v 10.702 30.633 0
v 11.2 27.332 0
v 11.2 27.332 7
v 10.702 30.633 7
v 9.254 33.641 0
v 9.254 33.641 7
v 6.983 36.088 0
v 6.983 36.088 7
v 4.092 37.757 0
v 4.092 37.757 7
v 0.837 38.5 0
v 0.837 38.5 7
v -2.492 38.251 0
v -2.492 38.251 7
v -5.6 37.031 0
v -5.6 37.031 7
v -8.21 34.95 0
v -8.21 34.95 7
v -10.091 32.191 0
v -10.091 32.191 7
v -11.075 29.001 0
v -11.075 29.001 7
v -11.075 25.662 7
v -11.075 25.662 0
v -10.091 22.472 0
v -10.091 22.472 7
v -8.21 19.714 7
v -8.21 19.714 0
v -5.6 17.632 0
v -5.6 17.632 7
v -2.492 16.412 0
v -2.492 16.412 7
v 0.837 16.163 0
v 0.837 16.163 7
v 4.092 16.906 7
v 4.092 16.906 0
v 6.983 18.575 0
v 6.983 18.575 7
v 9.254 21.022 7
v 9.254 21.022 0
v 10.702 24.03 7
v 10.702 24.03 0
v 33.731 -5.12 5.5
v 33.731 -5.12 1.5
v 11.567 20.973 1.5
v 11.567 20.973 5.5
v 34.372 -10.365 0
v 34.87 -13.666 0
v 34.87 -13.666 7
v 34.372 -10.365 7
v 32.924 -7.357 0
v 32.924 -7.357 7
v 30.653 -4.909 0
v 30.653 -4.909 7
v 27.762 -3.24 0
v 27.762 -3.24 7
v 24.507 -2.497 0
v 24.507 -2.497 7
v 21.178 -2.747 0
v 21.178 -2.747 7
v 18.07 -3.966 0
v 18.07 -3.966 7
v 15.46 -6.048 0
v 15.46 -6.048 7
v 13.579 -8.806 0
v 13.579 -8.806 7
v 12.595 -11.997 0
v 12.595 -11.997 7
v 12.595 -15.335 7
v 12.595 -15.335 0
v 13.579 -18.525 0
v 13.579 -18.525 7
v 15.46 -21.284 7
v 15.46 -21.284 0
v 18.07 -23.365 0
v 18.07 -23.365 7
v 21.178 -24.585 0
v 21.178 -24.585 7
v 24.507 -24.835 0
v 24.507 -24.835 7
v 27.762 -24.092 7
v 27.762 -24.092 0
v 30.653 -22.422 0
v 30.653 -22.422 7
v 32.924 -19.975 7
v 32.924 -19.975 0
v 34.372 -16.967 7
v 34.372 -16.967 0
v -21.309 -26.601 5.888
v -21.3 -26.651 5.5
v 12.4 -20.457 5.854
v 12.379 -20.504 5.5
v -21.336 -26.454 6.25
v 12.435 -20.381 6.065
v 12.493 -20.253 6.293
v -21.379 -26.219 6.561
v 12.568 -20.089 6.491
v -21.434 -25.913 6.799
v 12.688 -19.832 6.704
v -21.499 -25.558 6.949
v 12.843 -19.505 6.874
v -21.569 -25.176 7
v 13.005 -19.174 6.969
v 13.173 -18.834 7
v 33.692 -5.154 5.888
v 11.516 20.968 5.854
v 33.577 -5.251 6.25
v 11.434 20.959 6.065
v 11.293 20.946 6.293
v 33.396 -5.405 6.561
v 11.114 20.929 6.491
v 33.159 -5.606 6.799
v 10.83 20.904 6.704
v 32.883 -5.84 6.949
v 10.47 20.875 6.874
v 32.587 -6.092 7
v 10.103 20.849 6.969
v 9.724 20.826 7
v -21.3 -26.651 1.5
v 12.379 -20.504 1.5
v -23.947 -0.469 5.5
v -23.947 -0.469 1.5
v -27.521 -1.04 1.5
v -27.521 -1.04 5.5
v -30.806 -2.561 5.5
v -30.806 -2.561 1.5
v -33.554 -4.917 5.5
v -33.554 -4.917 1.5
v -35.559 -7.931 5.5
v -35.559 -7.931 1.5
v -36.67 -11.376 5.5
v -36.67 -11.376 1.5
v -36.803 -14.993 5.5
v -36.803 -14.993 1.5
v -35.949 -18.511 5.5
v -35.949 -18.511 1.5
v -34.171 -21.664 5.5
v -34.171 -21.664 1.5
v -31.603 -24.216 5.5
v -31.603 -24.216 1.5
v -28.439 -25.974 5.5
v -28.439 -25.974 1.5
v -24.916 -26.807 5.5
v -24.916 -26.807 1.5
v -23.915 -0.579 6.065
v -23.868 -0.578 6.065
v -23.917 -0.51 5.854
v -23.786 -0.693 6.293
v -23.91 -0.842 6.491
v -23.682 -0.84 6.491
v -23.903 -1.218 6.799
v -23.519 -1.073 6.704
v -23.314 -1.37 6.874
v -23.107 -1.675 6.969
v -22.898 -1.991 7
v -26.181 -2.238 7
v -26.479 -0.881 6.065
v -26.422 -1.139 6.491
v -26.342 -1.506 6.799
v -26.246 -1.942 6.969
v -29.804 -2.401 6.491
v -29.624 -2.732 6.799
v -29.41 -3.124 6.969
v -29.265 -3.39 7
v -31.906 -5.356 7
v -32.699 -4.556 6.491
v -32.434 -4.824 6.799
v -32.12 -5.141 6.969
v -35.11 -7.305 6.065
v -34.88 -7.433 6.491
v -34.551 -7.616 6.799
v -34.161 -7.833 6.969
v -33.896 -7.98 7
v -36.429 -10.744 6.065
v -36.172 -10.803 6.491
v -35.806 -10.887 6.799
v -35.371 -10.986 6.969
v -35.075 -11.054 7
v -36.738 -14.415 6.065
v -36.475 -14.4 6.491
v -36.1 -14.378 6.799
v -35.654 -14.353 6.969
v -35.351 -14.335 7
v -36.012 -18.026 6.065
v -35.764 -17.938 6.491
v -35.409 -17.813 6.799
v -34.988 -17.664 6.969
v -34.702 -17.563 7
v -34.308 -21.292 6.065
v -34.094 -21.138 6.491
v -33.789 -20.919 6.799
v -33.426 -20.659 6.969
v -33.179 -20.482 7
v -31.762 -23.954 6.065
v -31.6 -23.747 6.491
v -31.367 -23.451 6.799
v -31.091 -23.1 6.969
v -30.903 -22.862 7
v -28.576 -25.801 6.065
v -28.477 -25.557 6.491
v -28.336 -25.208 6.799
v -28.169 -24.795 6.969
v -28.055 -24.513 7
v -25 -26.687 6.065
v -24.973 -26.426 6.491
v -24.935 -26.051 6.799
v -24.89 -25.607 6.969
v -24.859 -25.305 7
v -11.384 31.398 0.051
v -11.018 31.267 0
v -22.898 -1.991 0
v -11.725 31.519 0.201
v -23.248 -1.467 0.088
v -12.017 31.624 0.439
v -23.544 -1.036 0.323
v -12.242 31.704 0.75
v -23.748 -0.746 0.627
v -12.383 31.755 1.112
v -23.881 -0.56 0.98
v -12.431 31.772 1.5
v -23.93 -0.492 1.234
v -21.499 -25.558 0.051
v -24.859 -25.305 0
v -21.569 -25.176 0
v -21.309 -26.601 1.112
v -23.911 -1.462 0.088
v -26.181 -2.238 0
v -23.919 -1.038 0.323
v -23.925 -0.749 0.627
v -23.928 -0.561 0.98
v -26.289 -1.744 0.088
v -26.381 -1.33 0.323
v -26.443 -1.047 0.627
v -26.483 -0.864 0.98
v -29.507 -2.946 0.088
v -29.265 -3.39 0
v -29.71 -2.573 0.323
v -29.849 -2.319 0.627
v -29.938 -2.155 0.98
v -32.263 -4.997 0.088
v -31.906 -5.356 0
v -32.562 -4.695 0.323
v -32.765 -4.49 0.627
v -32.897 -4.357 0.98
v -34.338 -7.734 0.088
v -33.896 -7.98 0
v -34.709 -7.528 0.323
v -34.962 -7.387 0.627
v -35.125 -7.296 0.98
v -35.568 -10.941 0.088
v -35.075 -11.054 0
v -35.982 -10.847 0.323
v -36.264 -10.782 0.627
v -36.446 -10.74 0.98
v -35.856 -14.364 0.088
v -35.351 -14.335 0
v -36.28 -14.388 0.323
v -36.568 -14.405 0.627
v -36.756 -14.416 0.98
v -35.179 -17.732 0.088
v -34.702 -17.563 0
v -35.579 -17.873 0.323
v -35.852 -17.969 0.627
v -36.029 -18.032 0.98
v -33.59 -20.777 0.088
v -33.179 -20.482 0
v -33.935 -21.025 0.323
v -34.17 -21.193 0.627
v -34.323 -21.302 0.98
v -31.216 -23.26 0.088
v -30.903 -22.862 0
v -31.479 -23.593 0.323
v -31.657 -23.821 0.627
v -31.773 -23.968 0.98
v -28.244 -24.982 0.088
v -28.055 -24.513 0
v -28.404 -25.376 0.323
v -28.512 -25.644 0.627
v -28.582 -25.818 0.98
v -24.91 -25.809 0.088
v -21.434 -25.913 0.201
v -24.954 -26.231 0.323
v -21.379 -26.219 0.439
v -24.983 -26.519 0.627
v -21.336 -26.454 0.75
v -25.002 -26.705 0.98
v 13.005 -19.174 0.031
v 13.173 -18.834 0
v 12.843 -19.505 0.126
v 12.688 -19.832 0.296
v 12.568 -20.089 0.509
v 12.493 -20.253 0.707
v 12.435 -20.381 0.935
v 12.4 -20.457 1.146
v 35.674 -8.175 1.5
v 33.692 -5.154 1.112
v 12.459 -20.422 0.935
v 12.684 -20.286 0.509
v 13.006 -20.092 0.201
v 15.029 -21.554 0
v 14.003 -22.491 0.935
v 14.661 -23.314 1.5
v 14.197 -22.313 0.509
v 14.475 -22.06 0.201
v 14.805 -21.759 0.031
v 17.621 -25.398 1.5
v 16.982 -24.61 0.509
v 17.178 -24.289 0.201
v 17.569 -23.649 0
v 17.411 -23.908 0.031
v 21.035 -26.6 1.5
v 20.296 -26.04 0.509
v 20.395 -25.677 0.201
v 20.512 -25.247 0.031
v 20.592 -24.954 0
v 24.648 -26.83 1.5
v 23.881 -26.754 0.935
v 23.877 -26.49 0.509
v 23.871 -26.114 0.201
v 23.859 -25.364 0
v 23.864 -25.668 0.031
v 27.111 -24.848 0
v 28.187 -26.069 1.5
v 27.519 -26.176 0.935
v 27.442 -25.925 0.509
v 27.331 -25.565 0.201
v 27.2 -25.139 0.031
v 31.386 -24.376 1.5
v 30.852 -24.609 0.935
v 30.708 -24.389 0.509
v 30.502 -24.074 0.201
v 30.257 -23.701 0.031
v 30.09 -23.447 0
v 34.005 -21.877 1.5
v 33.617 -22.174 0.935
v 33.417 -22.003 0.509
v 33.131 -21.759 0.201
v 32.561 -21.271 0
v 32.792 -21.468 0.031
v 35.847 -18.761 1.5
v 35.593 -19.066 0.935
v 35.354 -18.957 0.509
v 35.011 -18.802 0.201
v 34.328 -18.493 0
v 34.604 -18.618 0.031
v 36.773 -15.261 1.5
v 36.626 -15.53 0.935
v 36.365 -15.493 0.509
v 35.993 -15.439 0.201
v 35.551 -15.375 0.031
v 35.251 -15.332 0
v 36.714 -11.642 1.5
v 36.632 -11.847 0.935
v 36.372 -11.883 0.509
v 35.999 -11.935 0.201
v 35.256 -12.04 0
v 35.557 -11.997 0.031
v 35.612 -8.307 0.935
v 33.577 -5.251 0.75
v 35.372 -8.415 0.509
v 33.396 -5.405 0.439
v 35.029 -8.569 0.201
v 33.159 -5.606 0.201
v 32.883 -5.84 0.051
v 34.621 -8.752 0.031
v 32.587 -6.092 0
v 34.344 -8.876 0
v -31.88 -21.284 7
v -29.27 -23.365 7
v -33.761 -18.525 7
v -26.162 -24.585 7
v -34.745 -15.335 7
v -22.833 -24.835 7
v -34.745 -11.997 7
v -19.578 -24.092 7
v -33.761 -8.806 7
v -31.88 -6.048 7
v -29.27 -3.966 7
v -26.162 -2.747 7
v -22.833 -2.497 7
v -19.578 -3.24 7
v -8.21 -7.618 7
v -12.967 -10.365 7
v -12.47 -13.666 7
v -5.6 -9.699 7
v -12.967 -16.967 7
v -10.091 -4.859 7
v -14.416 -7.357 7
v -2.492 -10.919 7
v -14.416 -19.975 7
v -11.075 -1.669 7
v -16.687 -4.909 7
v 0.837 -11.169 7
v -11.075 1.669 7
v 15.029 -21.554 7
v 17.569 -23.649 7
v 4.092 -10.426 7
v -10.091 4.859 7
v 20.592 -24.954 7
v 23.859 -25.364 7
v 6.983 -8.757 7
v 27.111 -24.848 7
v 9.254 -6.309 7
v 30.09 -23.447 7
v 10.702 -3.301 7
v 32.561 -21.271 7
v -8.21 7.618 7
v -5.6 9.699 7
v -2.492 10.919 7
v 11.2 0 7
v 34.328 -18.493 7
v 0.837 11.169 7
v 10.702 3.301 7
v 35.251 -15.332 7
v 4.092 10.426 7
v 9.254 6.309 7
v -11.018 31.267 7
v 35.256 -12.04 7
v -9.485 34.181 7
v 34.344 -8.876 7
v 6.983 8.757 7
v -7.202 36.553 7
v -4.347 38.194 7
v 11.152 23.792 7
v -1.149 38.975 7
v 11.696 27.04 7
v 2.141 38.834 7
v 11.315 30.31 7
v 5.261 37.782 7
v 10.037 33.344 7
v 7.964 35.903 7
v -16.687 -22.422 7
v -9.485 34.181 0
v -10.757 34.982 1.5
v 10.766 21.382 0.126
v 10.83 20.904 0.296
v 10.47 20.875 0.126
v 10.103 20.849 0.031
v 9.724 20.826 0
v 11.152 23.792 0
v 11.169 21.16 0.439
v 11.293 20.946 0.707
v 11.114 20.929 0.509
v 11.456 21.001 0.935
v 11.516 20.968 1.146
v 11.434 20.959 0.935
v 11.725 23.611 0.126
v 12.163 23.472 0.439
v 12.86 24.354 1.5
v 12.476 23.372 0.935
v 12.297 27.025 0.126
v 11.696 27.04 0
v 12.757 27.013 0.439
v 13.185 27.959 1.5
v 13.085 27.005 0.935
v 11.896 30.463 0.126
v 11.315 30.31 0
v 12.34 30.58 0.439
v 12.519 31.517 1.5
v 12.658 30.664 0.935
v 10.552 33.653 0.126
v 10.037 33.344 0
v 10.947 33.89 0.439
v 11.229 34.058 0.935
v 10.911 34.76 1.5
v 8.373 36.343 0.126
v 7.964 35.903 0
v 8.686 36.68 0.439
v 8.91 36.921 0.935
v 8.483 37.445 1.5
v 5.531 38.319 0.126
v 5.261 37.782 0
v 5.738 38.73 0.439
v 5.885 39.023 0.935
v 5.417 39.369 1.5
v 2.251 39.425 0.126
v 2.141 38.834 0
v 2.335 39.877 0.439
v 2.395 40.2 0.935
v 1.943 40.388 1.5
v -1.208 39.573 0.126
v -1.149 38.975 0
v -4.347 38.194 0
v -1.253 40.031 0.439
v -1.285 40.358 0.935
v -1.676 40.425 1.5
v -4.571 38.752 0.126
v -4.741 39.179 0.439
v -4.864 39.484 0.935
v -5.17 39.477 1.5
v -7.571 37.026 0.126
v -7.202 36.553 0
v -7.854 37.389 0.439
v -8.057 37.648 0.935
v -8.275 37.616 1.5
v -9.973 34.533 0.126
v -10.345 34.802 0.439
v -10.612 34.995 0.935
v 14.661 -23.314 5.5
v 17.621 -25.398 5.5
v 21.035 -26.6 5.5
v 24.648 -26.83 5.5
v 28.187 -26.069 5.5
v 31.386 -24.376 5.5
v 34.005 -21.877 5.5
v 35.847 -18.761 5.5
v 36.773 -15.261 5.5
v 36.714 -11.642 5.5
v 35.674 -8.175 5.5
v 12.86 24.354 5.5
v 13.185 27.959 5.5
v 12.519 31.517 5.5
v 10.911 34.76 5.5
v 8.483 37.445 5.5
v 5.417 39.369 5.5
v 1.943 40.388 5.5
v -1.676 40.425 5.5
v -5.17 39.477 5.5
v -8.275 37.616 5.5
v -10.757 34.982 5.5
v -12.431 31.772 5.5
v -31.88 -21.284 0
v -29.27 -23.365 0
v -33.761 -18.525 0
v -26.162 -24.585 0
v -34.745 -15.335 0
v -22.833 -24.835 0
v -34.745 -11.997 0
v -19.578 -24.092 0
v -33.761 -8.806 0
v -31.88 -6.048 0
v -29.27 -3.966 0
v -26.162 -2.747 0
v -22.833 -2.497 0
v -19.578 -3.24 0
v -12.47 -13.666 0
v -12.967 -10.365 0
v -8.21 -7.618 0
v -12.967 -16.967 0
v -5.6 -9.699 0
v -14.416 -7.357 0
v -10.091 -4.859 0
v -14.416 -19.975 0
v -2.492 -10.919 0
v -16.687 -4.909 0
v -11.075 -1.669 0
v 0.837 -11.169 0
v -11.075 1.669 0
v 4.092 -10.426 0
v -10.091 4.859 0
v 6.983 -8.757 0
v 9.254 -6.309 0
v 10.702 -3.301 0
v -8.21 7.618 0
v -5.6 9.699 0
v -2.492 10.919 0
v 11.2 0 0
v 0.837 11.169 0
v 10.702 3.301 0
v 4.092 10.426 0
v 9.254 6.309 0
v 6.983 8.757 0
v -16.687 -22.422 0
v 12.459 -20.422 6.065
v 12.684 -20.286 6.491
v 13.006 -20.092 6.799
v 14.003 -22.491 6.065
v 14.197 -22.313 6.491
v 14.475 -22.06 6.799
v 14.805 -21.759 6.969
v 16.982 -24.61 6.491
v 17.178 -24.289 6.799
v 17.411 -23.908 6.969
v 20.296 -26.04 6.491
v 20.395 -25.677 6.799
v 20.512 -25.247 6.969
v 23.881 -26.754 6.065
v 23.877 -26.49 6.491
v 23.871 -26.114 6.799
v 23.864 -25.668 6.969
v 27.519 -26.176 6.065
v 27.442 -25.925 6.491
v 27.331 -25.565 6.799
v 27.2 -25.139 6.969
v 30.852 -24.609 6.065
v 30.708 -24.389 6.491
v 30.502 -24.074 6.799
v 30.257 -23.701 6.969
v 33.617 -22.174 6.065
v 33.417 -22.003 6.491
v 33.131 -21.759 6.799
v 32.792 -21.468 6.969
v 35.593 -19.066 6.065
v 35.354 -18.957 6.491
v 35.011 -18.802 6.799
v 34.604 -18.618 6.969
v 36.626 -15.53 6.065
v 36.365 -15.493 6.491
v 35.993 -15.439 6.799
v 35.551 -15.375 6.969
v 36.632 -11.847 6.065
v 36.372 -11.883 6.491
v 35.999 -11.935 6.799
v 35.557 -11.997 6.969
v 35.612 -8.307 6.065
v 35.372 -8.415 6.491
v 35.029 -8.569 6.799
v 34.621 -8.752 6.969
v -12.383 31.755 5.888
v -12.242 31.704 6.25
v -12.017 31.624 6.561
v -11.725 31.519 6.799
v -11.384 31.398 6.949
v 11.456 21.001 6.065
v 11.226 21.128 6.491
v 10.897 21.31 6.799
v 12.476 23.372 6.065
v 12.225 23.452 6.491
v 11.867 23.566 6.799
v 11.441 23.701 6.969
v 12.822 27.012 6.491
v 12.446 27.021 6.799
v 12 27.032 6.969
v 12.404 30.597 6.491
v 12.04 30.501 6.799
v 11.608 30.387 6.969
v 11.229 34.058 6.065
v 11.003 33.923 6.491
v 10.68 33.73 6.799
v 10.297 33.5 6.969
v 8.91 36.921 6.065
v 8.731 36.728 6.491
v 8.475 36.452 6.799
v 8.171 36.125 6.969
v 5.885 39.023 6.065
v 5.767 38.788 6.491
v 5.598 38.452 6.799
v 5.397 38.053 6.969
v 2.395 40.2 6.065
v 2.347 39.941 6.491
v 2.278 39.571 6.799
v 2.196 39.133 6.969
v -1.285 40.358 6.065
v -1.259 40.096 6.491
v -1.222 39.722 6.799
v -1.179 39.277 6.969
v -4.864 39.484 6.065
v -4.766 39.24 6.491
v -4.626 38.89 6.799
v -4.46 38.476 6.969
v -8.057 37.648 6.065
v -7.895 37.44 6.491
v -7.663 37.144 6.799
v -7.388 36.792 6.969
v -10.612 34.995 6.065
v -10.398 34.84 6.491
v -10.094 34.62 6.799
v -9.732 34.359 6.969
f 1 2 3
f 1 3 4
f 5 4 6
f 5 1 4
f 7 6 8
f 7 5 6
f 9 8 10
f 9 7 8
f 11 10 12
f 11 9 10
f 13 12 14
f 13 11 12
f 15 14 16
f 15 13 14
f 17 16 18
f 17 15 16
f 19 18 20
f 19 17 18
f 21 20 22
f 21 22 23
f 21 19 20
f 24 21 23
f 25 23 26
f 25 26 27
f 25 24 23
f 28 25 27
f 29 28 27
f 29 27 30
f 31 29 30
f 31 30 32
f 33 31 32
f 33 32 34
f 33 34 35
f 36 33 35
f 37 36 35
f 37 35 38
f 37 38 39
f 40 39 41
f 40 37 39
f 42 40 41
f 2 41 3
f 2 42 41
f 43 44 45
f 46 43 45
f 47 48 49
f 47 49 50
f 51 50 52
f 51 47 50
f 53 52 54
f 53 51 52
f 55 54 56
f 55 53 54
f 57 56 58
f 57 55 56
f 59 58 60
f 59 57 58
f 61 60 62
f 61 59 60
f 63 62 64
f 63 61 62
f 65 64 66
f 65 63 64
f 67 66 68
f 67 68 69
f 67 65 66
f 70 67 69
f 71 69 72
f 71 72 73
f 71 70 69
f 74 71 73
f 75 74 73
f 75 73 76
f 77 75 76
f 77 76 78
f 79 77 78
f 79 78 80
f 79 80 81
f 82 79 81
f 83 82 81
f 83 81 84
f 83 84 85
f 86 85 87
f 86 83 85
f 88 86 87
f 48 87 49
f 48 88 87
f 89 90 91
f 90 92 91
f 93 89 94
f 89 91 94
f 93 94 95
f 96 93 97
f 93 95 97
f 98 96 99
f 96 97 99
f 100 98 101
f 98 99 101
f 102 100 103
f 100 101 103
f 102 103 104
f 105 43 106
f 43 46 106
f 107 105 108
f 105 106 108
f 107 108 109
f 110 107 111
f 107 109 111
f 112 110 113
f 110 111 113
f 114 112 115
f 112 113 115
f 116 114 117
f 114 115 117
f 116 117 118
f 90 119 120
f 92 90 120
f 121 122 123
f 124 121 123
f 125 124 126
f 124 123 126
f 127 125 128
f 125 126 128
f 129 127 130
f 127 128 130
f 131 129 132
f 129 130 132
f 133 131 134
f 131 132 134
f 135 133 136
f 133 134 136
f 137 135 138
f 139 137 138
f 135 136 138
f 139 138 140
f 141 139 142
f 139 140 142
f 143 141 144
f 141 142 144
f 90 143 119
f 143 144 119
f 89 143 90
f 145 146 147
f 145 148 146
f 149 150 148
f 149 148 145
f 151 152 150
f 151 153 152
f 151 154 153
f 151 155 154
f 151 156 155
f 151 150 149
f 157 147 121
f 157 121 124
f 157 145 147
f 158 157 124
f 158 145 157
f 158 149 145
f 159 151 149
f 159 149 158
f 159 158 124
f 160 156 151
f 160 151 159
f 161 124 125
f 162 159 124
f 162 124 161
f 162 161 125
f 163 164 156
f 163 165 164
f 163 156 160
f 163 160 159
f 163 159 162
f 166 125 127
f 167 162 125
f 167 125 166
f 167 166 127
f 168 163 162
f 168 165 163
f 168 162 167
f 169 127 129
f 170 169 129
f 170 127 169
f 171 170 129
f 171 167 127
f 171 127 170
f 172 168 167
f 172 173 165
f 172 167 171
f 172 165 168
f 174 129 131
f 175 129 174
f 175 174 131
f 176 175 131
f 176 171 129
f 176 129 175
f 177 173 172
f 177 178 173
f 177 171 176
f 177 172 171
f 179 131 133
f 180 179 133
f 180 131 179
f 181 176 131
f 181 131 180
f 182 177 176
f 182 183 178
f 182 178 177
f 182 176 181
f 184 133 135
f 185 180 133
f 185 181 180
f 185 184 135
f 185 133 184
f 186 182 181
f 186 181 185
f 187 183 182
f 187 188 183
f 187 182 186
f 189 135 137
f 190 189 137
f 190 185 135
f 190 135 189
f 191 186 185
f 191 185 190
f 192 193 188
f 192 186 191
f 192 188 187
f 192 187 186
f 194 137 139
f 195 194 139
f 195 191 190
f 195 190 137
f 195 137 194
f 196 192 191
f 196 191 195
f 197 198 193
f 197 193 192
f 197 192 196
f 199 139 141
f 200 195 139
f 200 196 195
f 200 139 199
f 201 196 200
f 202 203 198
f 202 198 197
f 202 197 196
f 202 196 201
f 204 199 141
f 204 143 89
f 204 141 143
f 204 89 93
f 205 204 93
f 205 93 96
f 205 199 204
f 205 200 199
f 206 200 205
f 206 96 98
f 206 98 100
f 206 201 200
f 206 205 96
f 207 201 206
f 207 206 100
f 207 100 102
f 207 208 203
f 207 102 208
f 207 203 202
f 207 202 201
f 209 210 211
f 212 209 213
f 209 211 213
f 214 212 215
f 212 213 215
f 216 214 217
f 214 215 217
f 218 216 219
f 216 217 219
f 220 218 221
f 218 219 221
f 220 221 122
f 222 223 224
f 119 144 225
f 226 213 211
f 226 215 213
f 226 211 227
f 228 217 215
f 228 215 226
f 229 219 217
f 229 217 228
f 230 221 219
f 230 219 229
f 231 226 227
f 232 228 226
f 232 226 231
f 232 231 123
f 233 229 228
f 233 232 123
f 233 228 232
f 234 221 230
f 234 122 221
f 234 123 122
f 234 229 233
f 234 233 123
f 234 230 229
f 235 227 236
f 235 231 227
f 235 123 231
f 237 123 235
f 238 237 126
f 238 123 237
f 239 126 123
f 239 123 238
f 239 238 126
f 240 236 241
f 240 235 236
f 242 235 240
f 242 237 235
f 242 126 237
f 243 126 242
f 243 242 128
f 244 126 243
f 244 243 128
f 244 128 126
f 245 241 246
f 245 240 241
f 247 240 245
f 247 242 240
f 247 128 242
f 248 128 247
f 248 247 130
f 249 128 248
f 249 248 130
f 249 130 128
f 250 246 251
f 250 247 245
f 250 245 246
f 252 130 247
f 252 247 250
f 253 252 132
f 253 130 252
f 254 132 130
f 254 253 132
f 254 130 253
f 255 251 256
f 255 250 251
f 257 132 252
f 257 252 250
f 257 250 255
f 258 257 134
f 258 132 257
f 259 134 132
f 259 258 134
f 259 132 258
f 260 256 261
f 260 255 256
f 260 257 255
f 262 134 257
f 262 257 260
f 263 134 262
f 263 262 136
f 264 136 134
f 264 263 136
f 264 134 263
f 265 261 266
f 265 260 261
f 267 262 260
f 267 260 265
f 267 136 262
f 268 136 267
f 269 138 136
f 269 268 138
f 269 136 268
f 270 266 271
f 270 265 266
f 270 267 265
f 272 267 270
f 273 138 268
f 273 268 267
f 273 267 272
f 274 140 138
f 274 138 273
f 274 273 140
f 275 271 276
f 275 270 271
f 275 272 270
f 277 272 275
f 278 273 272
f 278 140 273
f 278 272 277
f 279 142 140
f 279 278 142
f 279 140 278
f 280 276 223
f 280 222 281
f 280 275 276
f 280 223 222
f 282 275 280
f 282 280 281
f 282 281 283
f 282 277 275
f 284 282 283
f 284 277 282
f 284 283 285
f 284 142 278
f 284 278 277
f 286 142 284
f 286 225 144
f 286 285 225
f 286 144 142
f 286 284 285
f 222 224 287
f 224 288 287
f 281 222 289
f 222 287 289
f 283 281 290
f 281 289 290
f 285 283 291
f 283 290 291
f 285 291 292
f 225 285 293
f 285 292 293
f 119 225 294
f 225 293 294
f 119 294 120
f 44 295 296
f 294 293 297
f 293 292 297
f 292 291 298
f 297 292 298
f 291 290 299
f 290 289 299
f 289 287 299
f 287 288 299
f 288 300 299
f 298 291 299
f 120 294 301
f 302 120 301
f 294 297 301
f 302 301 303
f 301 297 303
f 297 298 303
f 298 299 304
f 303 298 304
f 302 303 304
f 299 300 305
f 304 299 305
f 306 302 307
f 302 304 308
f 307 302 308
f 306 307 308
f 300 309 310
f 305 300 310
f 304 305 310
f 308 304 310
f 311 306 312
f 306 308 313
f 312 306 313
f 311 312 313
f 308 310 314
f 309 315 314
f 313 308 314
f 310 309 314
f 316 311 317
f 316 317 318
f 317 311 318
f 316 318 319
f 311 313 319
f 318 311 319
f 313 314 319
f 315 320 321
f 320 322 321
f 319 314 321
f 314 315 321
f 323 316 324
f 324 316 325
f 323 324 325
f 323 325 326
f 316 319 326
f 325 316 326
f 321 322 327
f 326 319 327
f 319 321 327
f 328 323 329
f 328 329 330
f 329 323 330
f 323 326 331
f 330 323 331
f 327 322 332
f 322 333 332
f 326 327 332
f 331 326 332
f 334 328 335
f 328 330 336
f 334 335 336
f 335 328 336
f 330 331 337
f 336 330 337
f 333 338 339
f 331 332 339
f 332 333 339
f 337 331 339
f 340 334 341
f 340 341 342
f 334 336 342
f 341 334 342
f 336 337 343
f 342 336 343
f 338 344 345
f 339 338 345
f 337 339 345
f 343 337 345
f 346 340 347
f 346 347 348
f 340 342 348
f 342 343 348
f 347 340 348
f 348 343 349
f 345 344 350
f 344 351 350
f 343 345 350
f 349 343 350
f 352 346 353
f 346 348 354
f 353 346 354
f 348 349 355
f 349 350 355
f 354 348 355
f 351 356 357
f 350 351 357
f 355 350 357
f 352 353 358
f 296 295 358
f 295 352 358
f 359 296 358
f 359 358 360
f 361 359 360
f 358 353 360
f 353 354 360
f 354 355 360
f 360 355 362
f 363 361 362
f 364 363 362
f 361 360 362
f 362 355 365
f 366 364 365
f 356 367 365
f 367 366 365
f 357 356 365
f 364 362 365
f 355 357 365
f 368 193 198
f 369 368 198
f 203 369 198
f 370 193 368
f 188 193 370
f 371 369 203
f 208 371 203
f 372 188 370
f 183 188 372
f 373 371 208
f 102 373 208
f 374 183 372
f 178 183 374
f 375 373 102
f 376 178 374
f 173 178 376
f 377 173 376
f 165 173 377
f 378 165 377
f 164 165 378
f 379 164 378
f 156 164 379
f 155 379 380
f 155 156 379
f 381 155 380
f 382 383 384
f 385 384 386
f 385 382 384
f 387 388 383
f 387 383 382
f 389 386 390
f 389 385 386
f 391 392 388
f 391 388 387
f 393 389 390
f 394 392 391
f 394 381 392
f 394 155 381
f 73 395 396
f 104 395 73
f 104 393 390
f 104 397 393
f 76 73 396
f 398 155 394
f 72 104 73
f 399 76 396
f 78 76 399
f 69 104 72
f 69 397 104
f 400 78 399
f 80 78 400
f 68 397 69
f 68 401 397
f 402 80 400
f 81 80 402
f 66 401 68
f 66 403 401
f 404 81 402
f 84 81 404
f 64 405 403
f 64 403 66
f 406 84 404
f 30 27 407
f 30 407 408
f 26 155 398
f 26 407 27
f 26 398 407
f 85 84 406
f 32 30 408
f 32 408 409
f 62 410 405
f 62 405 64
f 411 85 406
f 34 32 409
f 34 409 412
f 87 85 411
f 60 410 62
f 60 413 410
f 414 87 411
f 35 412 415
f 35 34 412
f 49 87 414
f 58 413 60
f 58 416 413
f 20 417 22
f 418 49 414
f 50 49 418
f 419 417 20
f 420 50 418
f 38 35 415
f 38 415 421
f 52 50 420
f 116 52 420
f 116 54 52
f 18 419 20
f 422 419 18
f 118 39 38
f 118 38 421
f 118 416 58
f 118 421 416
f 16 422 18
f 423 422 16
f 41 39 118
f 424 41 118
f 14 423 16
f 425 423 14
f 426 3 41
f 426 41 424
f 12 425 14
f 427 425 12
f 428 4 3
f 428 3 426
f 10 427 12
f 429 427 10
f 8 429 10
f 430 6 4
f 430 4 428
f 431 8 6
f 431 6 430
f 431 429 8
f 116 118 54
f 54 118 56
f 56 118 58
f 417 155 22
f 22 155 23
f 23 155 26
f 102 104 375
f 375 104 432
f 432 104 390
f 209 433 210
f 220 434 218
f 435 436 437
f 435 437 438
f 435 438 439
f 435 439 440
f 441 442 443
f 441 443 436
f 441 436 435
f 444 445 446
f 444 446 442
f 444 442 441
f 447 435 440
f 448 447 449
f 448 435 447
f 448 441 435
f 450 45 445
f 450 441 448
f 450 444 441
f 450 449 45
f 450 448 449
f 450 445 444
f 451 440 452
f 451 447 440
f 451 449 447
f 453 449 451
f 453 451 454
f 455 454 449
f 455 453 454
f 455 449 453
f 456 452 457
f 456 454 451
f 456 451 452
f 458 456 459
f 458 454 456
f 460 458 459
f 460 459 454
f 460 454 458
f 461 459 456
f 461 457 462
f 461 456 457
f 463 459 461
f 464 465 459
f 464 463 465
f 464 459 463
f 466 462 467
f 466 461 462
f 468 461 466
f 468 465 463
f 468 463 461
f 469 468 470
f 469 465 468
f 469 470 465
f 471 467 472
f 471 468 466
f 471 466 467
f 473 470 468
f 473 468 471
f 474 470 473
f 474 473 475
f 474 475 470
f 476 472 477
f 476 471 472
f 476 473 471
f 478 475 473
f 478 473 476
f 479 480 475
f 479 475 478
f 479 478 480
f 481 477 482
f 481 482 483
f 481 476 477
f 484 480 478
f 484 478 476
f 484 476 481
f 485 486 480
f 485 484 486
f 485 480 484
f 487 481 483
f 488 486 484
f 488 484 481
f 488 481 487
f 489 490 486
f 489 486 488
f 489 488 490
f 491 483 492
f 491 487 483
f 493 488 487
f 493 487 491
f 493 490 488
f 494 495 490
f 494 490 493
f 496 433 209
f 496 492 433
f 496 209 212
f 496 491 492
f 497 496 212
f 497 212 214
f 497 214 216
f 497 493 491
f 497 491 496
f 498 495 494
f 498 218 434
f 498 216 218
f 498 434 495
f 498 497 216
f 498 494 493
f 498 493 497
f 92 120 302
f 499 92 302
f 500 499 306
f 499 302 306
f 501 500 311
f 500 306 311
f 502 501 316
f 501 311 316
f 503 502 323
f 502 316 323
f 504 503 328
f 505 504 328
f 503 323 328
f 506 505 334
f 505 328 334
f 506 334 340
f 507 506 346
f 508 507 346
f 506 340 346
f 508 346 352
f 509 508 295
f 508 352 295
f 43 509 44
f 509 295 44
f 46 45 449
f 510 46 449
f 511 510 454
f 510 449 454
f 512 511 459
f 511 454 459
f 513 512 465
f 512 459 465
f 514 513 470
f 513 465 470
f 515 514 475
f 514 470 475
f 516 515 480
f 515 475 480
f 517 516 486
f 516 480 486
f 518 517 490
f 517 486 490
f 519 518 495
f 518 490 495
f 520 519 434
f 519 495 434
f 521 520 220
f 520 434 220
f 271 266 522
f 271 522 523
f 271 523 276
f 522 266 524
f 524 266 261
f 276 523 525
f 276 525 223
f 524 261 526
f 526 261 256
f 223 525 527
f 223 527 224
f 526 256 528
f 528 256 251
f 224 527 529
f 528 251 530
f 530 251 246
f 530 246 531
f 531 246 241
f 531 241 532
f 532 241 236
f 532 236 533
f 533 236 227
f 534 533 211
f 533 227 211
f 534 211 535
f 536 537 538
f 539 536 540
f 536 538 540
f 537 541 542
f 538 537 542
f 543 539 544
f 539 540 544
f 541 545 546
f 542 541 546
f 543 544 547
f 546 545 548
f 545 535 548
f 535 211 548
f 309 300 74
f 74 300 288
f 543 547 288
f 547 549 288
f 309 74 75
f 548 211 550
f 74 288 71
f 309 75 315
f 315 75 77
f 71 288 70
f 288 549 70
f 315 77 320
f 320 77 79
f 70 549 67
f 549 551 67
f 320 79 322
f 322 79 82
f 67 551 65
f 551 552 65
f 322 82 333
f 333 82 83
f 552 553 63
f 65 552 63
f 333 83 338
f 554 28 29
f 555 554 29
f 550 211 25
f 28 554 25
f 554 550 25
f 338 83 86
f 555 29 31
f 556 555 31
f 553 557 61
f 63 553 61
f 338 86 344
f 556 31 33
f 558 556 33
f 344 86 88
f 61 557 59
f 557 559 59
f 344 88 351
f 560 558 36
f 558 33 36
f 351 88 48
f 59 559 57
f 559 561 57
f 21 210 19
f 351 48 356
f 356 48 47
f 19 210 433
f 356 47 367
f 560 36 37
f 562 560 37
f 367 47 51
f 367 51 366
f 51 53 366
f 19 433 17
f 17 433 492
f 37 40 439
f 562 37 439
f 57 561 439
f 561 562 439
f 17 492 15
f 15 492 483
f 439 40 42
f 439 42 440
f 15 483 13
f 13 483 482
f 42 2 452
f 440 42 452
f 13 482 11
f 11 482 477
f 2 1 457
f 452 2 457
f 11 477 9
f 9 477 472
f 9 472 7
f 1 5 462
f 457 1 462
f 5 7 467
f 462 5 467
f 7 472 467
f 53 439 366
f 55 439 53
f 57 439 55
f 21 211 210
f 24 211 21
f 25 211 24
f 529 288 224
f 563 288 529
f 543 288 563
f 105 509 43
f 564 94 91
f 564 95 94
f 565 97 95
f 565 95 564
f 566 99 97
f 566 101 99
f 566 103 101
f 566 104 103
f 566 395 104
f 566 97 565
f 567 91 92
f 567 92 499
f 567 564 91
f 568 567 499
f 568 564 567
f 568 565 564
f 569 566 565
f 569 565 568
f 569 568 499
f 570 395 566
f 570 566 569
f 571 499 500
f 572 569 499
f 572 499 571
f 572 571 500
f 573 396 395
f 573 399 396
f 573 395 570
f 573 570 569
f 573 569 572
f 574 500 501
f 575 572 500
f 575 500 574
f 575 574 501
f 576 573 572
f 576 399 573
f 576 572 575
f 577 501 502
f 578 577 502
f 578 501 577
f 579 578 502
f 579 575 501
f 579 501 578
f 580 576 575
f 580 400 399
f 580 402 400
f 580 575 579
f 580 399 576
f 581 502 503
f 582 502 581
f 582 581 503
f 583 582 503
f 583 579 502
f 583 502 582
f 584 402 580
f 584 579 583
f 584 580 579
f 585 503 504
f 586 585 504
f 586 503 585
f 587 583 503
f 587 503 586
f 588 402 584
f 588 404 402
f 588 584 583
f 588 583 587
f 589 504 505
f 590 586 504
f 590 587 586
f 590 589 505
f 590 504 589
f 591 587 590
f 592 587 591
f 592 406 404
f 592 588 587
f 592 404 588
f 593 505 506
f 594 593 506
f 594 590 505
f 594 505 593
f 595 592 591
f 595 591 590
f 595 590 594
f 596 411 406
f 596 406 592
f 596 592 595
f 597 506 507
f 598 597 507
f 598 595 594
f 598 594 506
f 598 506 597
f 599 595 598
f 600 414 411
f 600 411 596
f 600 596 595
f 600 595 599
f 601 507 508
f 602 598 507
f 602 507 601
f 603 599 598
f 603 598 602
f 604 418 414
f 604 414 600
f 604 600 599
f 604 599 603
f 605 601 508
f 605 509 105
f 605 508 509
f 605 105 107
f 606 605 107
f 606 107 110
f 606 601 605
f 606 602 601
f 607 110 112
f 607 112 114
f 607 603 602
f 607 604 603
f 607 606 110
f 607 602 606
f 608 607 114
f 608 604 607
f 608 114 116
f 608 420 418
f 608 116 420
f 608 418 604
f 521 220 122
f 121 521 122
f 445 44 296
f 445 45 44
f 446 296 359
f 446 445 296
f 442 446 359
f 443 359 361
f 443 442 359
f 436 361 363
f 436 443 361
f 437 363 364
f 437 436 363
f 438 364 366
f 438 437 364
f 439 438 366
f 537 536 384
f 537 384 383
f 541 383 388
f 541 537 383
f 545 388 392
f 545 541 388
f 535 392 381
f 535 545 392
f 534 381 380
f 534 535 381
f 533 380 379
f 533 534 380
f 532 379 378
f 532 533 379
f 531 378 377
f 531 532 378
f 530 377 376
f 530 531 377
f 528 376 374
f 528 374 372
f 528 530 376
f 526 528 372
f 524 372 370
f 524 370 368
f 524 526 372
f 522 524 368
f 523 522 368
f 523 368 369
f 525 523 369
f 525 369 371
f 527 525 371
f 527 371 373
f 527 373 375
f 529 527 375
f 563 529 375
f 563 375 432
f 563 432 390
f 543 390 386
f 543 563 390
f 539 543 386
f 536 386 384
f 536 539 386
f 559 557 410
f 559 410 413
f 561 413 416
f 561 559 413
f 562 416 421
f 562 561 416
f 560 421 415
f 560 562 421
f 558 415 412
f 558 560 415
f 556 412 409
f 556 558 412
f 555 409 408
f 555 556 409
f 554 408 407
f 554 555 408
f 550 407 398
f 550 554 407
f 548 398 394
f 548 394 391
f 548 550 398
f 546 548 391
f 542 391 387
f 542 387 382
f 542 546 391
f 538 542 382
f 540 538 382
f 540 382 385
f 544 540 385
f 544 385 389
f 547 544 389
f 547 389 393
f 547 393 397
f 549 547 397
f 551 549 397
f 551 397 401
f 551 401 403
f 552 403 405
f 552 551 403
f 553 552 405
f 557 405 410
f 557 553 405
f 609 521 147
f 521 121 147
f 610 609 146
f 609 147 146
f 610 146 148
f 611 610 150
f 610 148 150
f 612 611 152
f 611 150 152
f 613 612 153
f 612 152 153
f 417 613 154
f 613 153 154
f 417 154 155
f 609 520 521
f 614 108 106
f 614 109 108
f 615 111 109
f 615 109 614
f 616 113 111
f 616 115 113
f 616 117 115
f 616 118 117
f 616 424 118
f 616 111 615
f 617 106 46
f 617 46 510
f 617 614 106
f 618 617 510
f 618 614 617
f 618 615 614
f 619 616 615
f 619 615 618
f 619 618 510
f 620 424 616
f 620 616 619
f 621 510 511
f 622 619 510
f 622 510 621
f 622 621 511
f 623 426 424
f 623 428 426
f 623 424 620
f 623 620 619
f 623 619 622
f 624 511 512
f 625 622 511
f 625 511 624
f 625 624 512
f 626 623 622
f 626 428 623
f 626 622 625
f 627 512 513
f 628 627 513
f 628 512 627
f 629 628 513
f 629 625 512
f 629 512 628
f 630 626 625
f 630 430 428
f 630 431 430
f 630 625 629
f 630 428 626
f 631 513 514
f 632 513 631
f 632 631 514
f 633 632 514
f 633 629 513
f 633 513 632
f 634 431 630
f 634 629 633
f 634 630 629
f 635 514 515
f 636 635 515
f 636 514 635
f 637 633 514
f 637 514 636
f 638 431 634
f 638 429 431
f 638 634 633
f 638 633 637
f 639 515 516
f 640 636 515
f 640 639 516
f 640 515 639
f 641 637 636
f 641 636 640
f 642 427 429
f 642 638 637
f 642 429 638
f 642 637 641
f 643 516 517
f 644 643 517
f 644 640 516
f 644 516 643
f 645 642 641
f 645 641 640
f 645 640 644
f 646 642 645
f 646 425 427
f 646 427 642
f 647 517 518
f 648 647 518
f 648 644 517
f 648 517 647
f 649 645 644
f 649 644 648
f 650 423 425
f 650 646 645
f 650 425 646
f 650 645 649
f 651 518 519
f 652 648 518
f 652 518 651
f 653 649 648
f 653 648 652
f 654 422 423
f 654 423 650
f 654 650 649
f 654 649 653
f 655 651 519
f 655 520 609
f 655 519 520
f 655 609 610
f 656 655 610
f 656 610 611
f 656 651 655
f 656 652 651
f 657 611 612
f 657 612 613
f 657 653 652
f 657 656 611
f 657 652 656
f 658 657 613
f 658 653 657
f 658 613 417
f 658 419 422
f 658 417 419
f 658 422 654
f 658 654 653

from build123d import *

# Parameters (mm, degrees)
F0_R     = 11.2
F1_DEPTH = 7
F2_R     = 1.5
F3_R     = 1.5


with BuildPart() as f1:
    # F0 (on Top) → F1 (new body)
    with BuildSketch(Plane.XY):
        with BuildLine():
            Line((33.730539, -5.120439), (11.567332, 20.972664))
            ThreePointArc((11.567332, 20.972664), (5.416765, 39.369046), (-12.430842, 31.771724))
            Line((-12.430842, 31.771724), (-23.946529, -0.468727))
            ThreePointArc((-23.946529, -0.468727), (-36.802979, -14.993466), (-21.299702, -26.651286))
            Line((-21.299702, -26.651286), (12.379191, -20.503938))
            ThreePointArc((12.379191, -20.503938), (31.386209, -24.375581), (33.730539, -5.120439))
        make_face()
        with Locations((-23.669915, -13.665829)):
            Circle(F0_R, mode=Mode.SUBTRACT)
        with Locations((23.669909, -13.665832)):
            Circle(F0_R, mode=Mode.SUBTRACT)
        Circle(F0_R, mode=Mode.SUBTRACT)
        with Locations((0, 27.33166)):
            Circle(F0_R, mode=Mode.SUBTRACT)
    extrude(amount=F1_DEPTH)

    # F2
    f2_edges = [f1.edges().sort_by_distance(p)[0] for p in [
        (22.648935, 7.926112, 7),
        (31.386209, -24.375581, 7),
        (-4.460256, -23.577612, 7),
        (-36.802979, -14.993466, 7),
        (-18.188685, 15.651498, 7),
        (5.416765, 39.369046, 7),
    ]]
    fillet(f2_edges, radius=F2_R)

    # F3
    f3_edges = [f1.edges().sort_by_distance(p)[0] for p in [
        (31.386209, -24.375581, 0),
        (22.648935, 7.926112, 0),
        (5.416765, 39.369046, 0),
        (-18.188685, 15.651498, 0),
        (-36.802979, -14.993466, 0),
        (-4.460256, -23.577612, 0),
    ]]
    fillet(f3_edges, radius=F3_R)


solid = f1.part
